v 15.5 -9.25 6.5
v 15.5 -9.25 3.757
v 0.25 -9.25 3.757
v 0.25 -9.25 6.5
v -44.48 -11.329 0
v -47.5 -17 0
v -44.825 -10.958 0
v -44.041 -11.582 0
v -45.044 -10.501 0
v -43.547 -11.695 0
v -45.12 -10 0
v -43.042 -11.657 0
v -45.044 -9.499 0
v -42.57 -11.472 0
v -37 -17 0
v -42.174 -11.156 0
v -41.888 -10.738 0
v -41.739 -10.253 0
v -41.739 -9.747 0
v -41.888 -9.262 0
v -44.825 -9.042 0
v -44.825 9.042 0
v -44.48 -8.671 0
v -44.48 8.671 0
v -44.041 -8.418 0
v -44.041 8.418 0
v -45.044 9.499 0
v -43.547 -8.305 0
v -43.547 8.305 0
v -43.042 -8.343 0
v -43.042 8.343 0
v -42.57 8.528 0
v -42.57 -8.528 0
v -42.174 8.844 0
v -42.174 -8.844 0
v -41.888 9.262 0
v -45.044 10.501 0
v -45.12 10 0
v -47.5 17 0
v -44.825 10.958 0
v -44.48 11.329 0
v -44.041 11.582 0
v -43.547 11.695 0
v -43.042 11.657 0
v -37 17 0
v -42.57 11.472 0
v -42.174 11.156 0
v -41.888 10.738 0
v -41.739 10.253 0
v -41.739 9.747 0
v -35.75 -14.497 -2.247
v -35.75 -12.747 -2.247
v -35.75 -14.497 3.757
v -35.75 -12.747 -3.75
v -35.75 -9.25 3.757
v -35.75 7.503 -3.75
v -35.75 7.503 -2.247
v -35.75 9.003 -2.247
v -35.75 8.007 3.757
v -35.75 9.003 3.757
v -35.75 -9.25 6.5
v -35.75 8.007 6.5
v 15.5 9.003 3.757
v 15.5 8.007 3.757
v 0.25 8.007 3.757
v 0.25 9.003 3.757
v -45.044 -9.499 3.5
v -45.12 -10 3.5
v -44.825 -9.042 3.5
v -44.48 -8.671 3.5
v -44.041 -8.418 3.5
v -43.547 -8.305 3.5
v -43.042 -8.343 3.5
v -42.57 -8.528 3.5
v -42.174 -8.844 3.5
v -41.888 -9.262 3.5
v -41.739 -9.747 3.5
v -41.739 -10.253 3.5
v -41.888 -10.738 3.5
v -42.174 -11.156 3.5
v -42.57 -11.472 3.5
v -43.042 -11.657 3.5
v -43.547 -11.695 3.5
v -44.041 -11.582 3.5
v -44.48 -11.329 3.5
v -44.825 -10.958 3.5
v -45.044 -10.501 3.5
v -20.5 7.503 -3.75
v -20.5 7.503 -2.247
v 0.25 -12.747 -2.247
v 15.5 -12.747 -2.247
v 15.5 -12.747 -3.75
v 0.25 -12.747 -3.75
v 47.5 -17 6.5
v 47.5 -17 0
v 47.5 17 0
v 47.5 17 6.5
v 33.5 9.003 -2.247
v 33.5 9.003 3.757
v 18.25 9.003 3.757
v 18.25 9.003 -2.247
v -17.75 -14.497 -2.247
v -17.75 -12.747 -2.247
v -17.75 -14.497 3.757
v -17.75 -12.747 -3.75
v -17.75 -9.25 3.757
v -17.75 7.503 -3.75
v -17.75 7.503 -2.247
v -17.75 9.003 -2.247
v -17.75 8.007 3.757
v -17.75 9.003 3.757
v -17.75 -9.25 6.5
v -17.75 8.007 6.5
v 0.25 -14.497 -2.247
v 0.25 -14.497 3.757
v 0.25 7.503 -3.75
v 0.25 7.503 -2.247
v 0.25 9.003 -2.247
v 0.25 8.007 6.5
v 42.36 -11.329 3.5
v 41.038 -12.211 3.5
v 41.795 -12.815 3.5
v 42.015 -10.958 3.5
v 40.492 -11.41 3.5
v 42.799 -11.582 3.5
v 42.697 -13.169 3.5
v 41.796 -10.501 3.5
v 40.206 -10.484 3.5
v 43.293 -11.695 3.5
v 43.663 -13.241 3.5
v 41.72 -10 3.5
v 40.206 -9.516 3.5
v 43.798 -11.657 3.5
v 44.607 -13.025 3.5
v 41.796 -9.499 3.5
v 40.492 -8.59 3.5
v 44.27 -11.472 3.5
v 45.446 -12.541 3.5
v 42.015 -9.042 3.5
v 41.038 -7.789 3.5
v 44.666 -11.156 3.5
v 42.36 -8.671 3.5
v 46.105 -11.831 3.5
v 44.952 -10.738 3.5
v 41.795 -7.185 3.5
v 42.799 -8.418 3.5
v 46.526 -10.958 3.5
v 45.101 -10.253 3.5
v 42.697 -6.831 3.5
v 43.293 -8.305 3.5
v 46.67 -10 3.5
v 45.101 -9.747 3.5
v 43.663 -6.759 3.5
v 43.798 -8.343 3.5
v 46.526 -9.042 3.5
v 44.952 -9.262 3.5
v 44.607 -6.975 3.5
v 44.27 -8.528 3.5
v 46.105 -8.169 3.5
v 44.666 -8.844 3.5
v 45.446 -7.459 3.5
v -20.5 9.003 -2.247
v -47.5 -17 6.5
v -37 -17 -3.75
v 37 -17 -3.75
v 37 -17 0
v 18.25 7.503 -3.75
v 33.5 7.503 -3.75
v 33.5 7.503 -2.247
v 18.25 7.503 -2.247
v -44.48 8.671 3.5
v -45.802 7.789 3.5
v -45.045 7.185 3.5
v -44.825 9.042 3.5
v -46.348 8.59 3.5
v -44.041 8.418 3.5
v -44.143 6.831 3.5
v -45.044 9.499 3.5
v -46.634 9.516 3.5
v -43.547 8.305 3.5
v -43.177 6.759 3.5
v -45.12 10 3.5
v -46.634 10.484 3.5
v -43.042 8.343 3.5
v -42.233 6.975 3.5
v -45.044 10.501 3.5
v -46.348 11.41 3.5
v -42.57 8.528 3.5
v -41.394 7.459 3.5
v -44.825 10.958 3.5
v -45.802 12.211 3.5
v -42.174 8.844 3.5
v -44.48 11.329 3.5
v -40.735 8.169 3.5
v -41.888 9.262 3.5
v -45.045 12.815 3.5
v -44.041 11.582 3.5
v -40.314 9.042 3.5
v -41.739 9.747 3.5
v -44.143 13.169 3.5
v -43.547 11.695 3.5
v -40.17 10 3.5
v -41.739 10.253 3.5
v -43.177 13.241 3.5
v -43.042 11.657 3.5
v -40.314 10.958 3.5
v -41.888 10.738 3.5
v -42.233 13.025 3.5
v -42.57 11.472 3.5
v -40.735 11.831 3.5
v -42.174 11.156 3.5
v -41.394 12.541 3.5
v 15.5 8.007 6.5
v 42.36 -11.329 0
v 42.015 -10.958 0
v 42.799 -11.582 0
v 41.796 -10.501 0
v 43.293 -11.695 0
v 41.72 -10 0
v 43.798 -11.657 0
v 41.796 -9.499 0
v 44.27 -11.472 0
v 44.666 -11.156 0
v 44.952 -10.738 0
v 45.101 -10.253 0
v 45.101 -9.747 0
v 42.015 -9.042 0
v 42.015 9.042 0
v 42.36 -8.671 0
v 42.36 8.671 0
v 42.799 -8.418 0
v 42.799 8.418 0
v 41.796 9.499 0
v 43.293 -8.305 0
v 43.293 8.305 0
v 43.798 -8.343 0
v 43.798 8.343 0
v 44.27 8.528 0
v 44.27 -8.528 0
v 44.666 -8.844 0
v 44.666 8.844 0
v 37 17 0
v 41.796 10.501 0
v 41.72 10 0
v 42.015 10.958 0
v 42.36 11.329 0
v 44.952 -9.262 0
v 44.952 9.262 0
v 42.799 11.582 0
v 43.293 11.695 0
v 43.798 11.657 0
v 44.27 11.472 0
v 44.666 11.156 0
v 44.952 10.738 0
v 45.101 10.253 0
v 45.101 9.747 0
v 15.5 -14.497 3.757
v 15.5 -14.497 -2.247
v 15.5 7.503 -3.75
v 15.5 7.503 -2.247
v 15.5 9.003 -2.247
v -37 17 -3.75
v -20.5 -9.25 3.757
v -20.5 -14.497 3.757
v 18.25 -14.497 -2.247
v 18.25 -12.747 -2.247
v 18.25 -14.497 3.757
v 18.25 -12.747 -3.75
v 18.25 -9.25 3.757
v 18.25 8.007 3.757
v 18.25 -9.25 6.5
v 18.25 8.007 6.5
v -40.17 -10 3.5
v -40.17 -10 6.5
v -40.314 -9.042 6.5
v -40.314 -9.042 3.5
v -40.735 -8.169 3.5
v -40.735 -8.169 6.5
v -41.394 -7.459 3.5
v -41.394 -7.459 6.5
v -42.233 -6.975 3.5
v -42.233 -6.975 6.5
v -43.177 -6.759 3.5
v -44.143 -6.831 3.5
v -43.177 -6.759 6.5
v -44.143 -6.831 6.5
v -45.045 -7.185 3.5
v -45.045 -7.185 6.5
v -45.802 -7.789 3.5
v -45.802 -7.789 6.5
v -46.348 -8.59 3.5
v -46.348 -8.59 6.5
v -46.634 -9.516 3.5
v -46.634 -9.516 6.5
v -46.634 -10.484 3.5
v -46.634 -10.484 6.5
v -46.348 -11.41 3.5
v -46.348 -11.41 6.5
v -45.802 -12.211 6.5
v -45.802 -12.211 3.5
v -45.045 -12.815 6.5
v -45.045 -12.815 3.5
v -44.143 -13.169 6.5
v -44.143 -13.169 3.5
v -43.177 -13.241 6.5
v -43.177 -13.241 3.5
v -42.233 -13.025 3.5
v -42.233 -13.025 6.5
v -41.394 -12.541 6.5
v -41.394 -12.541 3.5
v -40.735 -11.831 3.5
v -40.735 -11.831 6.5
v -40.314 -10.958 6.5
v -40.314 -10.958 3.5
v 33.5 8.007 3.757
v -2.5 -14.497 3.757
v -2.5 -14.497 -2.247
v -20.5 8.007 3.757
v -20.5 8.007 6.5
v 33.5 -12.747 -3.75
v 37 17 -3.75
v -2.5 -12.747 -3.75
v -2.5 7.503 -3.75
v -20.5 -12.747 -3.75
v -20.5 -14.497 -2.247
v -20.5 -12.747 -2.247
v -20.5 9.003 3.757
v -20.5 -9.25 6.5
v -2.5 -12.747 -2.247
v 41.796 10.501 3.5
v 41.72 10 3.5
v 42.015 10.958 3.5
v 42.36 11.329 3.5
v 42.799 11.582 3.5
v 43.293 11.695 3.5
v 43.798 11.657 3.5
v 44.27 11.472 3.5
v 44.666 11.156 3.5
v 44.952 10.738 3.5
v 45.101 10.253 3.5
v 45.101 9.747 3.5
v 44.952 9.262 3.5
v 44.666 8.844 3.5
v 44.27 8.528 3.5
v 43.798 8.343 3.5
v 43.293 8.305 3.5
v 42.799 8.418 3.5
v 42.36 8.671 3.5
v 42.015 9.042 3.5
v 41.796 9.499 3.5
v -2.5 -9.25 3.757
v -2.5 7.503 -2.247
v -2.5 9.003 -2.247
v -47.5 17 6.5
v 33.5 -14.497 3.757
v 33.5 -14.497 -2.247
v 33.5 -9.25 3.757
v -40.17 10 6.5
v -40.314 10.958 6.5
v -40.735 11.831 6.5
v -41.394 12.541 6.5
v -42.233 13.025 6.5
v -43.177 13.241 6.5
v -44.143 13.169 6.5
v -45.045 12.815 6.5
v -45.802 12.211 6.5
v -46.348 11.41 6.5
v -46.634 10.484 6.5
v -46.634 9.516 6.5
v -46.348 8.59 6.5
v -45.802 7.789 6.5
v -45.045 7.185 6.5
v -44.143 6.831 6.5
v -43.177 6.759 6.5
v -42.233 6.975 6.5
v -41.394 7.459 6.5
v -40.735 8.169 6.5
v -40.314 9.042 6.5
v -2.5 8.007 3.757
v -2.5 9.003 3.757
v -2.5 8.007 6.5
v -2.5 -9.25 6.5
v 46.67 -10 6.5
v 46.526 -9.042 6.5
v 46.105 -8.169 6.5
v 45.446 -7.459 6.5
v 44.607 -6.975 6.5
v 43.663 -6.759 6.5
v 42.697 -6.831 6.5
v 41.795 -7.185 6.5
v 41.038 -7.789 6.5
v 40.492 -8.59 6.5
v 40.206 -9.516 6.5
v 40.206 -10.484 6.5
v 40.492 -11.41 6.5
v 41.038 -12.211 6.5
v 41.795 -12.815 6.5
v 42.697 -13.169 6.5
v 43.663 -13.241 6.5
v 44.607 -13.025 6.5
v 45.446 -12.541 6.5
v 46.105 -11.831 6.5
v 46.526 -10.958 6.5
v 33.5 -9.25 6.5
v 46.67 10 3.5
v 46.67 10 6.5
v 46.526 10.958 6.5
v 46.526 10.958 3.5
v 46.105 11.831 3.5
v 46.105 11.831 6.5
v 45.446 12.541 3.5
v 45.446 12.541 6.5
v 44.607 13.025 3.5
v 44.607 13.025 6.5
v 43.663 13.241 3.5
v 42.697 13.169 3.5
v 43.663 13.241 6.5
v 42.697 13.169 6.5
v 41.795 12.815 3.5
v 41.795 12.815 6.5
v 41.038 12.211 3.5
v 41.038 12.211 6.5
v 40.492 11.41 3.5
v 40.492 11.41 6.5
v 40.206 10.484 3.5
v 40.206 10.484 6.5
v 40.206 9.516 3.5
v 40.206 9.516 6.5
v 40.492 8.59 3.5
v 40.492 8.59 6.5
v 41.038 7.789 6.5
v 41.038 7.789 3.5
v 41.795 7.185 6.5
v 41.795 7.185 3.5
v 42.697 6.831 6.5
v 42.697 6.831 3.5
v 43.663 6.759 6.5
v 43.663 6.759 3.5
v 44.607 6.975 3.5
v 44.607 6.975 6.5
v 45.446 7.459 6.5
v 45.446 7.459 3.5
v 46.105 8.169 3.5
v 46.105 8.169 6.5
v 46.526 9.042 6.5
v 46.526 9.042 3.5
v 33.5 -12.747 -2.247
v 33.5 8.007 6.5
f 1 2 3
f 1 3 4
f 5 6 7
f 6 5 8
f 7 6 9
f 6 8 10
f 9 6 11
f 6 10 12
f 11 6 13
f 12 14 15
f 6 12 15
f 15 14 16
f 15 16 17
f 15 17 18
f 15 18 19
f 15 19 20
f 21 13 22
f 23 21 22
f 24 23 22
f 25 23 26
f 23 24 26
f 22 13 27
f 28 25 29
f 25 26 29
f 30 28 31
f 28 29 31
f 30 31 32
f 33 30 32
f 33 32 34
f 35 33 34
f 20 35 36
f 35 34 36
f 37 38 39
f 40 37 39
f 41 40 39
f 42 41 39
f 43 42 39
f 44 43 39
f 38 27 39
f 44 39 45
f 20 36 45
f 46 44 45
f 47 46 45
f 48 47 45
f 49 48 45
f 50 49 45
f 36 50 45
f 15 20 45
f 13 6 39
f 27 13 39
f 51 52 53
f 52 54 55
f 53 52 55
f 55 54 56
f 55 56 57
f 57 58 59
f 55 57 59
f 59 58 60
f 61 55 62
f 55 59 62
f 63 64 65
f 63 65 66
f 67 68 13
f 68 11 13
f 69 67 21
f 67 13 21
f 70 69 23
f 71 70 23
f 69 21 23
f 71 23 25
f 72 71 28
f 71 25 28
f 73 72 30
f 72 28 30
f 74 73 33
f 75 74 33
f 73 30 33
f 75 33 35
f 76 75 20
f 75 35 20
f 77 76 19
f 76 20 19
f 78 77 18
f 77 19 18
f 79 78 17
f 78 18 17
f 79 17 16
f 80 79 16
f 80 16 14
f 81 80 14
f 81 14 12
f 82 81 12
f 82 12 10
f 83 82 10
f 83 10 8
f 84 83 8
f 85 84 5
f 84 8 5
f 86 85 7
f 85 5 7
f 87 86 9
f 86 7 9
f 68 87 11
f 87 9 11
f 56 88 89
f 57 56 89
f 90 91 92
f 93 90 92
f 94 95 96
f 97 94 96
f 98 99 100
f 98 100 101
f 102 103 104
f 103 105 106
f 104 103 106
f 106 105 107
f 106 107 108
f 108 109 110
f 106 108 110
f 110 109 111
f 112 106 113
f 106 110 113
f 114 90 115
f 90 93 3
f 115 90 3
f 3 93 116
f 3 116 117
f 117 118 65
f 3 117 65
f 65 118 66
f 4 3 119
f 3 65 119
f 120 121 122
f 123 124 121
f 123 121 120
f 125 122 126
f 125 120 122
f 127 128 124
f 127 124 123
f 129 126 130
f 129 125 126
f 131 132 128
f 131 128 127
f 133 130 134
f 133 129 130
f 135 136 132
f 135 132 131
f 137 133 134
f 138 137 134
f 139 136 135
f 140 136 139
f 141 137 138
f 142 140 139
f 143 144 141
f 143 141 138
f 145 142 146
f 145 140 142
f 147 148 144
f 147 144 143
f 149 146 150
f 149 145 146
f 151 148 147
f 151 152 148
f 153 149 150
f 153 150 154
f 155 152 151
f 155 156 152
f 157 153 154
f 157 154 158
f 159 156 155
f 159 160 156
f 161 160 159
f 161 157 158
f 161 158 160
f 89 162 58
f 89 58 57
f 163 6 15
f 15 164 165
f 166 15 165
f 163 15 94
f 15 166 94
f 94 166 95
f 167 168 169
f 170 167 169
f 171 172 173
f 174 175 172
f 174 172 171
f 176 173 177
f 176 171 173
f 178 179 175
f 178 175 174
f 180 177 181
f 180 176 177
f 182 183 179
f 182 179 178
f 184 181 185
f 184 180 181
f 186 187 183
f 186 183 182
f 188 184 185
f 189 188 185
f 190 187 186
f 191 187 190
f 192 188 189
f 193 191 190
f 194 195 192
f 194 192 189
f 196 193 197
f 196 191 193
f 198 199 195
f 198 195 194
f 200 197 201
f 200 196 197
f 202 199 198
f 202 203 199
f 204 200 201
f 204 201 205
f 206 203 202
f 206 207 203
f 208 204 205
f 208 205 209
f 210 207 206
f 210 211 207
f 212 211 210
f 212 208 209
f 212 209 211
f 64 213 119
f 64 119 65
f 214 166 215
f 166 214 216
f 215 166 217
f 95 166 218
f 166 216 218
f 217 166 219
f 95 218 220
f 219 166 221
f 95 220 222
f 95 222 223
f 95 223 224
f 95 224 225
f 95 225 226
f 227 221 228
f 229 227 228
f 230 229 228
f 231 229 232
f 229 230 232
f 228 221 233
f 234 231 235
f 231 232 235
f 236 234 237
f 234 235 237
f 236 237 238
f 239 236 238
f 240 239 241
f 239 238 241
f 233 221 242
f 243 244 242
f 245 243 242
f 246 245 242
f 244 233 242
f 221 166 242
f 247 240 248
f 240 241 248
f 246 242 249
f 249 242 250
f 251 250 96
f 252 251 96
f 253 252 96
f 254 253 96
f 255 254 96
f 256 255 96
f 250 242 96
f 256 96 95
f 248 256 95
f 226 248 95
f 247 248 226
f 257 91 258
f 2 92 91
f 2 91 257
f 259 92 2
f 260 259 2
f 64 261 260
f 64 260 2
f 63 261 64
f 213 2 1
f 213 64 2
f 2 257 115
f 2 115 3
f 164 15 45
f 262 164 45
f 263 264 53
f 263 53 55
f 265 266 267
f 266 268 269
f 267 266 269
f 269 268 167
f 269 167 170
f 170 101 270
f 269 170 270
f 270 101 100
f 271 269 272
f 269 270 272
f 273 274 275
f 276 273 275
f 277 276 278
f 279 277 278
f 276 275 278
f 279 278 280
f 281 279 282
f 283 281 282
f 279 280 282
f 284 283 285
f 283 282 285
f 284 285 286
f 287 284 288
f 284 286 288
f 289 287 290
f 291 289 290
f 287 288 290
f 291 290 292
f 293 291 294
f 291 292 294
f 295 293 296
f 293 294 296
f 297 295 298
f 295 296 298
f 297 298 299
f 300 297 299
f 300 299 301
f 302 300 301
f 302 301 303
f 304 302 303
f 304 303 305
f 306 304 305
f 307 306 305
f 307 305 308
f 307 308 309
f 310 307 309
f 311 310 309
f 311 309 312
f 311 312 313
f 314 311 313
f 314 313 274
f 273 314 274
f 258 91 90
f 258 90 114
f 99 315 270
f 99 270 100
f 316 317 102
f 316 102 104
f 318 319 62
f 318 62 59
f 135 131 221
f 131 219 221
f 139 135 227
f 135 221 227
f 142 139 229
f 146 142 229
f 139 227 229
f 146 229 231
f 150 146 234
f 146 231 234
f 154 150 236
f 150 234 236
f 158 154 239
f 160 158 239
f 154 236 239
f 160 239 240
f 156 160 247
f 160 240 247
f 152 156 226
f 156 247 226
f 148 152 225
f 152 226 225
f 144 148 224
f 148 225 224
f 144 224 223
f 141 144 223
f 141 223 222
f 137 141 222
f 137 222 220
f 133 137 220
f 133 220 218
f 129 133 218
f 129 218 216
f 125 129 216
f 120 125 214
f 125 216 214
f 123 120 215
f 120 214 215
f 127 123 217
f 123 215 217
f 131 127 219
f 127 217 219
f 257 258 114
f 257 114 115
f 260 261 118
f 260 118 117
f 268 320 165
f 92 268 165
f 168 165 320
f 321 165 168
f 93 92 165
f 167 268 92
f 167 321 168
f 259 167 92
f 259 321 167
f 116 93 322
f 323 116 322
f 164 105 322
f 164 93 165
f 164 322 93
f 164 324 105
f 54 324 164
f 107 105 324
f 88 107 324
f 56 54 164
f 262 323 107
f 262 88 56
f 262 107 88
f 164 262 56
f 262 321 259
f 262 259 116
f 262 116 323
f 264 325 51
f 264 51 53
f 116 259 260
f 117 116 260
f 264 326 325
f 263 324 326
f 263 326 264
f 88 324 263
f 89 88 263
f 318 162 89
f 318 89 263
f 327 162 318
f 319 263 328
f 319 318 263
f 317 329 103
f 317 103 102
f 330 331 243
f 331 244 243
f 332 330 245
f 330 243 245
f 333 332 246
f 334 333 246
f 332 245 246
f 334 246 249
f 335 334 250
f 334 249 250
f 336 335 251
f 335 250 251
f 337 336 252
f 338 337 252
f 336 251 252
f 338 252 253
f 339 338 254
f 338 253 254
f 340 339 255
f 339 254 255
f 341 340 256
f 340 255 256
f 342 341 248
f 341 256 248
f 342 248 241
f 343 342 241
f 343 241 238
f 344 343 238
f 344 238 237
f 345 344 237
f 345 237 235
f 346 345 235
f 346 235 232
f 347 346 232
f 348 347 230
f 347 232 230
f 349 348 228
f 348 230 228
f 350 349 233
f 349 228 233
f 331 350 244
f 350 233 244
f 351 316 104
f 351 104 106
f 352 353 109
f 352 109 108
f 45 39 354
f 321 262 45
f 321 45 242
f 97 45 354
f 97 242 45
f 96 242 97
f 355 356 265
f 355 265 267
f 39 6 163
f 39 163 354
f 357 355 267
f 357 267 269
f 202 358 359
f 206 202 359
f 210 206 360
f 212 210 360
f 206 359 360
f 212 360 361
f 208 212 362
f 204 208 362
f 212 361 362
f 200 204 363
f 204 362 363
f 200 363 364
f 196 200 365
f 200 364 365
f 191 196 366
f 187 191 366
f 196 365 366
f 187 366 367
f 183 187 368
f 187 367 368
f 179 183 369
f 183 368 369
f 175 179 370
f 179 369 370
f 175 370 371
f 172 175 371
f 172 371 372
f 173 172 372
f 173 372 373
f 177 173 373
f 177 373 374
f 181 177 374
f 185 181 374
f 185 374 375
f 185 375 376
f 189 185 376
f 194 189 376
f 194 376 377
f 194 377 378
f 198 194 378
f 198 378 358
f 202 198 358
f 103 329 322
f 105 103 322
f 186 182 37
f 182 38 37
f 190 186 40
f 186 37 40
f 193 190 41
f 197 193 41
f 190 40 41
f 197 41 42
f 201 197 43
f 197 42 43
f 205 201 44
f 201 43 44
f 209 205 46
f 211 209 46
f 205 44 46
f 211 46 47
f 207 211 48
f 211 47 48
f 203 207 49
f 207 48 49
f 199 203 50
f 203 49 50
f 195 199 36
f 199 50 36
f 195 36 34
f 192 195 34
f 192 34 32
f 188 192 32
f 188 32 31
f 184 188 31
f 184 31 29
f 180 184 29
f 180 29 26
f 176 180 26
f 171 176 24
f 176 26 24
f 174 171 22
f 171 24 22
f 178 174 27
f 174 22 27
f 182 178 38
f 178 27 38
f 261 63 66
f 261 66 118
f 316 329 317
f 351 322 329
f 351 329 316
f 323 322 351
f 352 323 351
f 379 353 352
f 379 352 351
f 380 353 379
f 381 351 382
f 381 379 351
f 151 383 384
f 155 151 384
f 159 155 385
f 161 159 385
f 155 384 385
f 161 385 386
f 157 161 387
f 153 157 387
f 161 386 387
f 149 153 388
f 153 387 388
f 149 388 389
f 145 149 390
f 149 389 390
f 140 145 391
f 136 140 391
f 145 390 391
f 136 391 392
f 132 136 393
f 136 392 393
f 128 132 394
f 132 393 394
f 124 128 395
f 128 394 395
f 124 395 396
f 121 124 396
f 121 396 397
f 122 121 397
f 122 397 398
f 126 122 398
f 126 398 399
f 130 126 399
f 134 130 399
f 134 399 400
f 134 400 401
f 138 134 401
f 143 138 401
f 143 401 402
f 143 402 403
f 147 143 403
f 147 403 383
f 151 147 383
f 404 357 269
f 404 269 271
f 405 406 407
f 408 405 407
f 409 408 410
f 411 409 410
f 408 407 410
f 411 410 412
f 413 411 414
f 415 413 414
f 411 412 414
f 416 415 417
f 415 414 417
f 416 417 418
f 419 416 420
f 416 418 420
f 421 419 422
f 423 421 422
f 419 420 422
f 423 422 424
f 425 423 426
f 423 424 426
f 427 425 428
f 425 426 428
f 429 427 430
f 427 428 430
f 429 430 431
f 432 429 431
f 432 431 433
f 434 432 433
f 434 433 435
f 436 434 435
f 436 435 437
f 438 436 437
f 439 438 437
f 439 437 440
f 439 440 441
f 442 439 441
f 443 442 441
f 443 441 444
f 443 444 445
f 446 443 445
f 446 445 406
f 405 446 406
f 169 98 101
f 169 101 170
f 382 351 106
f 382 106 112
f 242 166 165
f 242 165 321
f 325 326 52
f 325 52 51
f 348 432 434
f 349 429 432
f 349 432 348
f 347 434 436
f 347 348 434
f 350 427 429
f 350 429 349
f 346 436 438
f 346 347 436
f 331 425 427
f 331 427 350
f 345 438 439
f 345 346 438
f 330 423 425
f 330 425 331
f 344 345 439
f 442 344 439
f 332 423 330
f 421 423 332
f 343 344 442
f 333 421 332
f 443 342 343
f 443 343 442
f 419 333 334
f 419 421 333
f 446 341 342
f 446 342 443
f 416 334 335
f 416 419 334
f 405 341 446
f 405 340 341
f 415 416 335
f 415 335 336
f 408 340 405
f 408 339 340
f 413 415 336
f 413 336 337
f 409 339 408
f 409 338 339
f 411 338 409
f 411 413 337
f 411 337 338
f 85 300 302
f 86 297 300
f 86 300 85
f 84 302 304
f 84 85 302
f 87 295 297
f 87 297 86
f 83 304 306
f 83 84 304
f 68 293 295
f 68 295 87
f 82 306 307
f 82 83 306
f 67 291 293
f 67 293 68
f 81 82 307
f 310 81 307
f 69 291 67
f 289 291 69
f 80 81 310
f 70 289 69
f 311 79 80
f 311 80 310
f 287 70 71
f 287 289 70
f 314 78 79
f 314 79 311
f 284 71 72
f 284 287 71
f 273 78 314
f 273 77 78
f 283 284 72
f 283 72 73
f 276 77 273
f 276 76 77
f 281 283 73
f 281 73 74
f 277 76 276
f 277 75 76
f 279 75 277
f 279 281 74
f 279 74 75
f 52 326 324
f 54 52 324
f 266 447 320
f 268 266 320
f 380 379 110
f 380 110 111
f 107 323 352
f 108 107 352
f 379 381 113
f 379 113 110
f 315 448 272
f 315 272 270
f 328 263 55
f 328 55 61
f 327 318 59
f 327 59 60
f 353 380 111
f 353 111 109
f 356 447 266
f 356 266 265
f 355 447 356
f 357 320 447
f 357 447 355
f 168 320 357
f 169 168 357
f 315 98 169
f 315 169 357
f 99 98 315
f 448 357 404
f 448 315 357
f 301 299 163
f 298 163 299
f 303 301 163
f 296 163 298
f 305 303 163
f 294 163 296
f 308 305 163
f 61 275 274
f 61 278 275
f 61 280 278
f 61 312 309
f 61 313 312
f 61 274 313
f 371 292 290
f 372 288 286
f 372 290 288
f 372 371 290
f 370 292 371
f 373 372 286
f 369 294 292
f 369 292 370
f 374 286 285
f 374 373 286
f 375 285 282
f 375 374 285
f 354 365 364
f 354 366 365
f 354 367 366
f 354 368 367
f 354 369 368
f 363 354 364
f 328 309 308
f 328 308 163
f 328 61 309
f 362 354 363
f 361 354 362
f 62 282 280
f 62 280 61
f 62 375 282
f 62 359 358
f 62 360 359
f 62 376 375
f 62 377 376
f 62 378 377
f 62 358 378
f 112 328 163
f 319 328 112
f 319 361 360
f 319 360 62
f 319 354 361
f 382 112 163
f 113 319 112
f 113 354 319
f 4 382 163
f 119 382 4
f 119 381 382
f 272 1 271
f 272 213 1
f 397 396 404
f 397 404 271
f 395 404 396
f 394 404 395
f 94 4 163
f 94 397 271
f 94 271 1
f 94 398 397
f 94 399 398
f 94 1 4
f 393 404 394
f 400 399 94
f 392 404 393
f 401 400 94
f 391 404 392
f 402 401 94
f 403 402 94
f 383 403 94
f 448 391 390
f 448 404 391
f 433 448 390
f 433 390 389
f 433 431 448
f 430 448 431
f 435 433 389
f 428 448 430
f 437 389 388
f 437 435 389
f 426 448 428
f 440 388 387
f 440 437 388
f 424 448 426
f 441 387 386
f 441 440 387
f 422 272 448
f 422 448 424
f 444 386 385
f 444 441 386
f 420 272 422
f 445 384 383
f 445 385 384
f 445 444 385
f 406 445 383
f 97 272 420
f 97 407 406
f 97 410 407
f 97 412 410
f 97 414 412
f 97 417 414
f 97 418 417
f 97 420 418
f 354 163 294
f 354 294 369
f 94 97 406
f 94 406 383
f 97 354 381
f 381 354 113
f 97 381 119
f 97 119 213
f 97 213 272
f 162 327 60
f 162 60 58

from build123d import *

# Parameters (mm, degrees)
SKETCH1_W                      = 95
SKETCH1_H                      = 34
BOSS_EXTRUDE1_DEPTH            = 6.5
SKETCH2_W                      = 74
SKETCH2_H                      = 34
BOSS_EXTRUDE2_DEPTH            = 3.75
CBORE_FOR_M3_SHCS1_D           = 3.4
CBORE_FOR_M3_SHCS1_DEPTH       = 10.1
CBORE_FOR_M3_SHCS1_CBORE_D     = 6.5
CBORE_FOR_M3_SHCS1_CBORE_DEPTH = 3
CBORE_FOR_M3_SHCS1_TIP         = 1.021463052
CUT_EXTRUDE1_DEPTH             = 15.25
LPATTERN1_COUNT                = 4
LPATTERN1_PITCH                = 18


with BuildPart() as part:
    # Sketch1 → Boss-Extrude1 (new body)
    with BuildSketch(Plane.XY):
        Rectangle(SKETCH1_W, SKETCH1_H)
    extrude(amount=BOSS_EXTRUDE1_DEPTH)

    # Sketch2 → Boss-Extrude2 (add)
    with BuildSketch(Plane(origin=(0, 0, 0), x_dir=(-1, 0, 0), z_dir=(0, 0, -1))):
        Rectangle(SKETCH2_W, SKETCH2_H)
    extrude(amount=BOSS_EXTRUDE2_DEPTH)

    # CBORE for M3 SHCS1
    with Locations(Plane.XY.offset(6.5)):
        with Locations((-43.42, 10), (-43.42, -10), (43.42, 10), (43.42, -10)):
            CounterBoreHole(CBORE_FOR_M3_SHCS1_D / 2, CBORE_FOR_M3_SHCS1_CBORE_D / 2, CBORE_FOR_M3_SHCS1_CBORE_DEPTH, depth=CBORE_FOR_M3_SHCS1_DEPTH)
            with Locations((0, 0, -(CBORE_FOR_M3_SHCS1_DEPTH + CBORE_FOR_M3_SHCS1_TIP / 2))):  # 118° drill point
                Cone(0, CBORE_FOR_M3_SHCS1_D / 2, CBORE_FOR_M3_SHCS1_TIP, mode=Mode.SUBTRACT)

    # Sketch7 → Cut-Extrude1 (cut)
    with BuildSketch(Plane(origin=(33.5, 0, 0), x_dir=(0, 0, -1), z_dir=(1, 0, 0))):
        Polygon((-6.503383917, 8.006767833), (-3.756779362, 8.006767833), (-3.756779362, 9.003383917), (2.246616083, 9.003383917), (2.246616083, 7.503383917), (3.746616083, 7.503383917), (6.355468839, 7.503383917), (6.355468839, -12.746616083), (3.871124209, -12.746616083), (3.746616083, -12.746616083), (2.246616083, -12.746616083), (2.246616083, -14.496616083), (-3.756779362, -14.496616083), (-3.756779362, -9.25), (-6.503383917, -9.25), align=None)
    cut_extrude1 = extrude(amount=-CUT_EXTRUDE1_DEPTH, mode=Mode.SUBTRACT)

    # LPattern1: Cut-Extrude1 ×4
    with Locations(*[(-i * LPATTERN1_PITCH, 0, 0) for i in range(1, LPATTERN1_COUNT)]):
        add(cut_extrude1, mode=Mode.SUBTRACT)


solid = part.part
